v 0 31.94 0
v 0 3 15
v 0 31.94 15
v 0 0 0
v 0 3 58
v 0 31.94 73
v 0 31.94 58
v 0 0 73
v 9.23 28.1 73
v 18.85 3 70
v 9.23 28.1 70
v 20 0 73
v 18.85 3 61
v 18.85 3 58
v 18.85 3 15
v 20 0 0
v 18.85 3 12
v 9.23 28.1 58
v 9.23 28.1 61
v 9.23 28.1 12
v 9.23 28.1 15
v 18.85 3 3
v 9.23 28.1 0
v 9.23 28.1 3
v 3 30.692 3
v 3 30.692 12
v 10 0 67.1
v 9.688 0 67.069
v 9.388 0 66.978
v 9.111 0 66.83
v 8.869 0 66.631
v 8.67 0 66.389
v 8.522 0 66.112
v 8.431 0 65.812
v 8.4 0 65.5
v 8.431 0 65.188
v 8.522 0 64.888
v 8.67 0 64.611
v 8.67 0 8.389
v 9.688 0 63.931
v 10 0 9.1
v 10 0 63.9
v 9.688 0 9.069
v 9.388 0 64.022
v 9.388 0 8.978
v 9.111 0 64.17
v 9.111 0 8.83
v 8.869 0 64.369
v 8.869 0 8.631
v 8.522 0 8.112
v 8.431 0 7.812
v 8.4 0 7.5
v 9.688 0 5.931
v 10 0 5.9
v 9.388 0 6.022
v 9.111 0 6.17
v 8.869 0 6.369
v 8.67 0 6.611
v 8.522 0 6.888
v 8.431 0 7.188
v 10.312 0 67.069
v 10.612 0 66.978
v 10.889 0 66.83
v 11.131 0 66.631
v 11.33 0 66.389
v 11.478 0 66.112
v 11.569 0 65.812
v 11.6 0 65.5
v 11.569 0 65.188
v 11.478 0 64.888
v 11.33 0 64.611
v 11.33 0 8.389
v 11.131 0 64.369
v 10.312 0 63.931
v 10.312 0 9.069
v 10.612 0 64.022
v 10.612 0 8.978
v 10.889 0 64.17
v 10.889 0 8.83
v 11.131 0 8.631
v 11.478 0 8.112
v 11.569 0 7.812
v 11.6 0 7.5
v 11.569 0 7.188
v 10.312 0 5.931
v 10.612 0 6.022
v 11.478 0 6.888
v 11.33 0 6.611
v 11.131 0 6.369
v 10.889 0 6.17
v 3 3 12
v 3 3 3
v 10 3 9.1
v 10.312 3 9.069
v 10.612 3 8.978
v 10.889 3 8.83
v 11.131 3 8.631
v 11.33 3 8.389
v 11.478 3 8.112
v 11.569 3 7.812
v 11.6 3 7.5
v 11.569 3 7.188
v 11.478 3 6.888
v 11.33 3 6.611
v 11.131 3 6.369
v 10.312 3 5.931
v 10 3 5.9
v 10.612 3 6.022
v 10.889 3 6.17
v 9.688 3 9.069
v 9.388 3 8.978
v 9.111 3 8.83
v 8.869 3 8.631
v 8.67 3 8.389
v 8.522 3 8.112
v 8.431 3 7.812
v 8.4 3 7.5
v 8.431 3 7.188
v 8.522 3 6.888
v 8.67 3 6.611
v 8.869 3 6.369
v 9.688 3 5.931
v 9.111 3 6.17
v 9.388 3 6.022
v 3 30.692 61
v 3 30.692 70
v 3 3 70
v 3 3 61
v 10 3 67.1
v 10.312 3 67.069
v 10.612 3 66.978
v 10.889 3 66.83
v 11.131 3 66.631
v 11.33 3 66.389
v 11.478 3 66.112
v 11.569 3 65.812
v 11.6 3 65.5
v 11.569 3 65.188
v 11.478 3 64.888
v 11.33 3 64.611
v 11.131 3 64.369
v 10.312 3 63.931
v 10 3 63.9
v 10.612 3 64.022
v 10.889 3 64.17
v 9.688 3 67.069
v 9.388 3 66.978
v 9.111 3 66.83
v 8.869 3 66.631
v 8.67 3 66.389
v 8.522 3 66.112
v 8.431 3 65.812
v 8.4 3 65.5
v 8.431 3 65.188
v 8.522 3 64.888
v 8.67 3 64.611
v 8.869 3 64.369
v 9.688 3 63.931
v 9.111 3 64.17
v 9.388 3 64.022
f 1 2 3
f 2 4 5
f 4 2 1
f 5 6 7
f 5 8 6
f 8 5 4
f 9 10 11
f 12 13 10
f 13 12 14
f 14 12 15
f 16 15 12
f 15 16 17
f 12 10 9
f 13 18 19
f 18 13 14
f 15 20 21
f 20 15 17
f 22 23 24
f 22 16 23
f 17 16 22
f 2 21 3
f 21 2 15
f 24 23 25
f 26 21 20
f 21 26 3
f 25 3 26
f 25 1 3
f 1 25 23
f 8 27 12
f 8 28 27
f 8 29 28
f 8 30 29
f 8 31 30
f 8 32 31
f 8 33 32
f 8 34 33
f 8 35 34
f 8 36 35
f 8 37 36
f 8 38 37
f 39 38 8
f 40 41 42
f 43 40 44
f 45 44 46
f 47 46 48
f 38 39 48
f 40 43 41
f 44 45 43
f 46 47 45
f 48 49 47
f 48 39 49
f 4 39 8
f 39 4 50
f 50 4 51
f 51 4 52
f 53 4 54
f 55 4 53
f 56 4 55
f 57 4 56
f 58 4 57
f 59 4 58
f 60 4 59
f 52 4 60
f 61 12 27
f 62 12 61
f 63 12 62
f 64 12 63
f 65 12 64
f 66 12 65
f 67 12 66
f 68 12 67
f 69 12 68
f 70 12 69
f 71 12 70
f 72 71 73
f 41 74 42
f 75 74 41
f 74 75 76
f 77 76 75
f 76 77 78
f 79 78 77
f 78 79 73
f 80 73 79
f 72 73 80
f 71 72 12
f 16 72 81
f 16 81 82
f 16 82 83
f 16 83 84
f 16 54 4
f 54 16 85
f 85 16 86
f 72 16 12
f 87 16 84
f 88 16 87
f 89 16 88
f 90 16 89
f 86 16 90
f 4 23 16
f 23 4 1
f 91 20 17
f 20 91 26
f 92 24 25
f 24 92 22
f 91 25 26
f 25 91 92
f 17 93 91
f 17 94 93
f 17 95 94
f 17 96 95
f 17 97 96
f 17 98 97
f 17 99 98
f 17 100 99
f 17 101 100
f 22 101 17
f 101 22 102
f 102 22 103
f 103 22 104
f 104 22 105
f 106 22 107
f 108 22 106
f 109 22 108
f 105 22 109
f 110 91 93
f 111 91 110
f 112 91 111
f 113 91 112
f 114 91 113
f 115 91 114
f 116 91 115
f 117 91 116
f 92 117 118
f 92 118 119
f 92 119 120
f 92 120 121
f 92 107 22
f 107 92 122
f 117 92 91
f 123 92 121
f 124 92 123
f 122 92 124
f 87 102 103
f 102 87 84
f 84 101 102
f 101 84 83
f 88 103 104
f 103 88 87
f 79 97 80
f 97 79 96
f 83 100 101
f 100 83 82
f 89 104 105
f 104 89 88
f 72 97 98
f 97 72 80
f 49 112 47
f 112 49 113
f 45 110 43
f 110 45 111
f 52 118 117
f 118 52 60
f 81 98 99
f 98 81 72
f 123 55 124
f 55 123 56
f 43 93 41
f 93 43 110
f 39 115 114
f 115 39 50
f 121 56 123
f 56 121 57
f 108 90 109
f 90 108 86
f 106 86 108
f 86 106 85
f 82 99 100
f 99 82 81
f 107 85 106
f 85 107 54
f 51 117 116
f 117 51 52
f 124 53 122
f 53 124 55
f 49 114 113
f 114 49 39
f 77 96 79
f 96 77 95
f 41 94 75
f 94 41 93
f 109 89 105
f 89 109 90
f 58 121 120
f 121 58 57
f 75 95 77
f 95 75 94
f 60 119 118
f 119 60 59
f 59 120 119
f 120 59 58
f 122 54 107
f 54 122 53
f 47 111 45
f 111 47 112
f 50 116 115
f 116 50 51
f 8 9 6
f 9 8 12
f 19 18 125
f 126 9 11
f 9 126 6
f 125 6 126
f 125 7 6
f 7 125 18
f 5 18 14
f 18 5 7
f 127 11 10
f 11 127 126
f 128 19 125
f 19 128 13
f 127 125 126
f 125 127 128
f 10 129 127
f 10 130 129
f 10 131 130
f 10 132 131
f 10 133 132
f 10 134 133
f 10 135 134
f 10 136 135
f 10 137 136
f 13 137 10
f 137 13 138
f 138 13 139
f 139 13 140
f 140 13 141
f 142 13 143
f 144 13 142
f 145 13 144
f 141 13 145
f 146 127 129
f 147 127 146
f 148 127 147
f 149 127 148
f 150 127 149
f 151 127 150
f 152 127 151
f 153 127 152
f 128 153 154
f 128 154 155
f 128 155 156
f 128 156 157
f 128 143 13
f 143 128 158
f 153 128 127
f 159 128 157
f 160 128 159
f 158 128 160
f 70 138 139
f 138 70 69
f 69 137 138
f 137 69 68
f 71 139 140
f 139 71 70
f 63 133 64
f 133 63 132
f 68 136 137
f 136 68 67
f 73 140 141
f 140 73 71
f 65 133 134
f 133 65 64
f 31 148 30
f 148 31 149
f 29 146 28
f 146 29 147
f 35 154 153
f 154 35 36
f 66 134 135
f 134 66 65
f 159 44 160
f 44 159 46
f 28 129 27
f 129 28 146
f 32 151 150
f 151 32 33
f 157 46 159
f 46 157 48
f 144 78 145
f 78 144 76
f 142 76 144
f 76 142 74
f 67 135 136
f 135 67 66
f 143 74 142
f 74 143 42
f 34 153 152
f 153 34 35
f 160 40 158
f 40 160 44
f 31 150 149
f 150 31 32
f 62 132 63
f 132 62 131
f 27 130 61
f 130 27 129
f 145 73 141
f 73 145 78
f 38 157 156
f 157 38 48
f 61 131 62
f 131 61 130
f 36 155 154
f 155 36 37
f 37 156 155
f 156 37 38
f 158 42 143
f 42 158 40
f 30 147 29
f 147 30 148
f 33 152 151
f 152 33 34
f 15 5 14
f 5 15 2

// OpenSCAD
// Leg profile - Nostromo stand
module leg_profile() {
    polygon(points=[
        [0, 0],        // O - right angle
        [0, 31.94],    // A - top
        [9.23, 28.10], // B - 10mm along hypotenuse from A
        [20, 0]        // D - 20mm along base from O
    ]);
}

wall = 3;

module leg() {
    difference() {
        linear_extrude(height=15)
            leg_profile();

        translate([wall, wall, wall])
            cube([50, 50, 15 - 2*wall]);

        // M3 hole in the base (ZX plane)
        translate([10, -1, 15/2])
            rotate([-90, 0, 0])
                cylinder(h=wall+2, d=3.2, $fn=32);
    }
}

// First leg
leg();

// Second leg, offset 58mm along Z
translate([0, 0, 58])
    leg();

// Connecting bar along the base (XZ plane), trimmed to leg profile
intersection() {
    translate([0, 0, 15])
        cube([20, wall, 58 - 15]);
    linear_extrude(height=58 + 15)
        leg_profile();
}
